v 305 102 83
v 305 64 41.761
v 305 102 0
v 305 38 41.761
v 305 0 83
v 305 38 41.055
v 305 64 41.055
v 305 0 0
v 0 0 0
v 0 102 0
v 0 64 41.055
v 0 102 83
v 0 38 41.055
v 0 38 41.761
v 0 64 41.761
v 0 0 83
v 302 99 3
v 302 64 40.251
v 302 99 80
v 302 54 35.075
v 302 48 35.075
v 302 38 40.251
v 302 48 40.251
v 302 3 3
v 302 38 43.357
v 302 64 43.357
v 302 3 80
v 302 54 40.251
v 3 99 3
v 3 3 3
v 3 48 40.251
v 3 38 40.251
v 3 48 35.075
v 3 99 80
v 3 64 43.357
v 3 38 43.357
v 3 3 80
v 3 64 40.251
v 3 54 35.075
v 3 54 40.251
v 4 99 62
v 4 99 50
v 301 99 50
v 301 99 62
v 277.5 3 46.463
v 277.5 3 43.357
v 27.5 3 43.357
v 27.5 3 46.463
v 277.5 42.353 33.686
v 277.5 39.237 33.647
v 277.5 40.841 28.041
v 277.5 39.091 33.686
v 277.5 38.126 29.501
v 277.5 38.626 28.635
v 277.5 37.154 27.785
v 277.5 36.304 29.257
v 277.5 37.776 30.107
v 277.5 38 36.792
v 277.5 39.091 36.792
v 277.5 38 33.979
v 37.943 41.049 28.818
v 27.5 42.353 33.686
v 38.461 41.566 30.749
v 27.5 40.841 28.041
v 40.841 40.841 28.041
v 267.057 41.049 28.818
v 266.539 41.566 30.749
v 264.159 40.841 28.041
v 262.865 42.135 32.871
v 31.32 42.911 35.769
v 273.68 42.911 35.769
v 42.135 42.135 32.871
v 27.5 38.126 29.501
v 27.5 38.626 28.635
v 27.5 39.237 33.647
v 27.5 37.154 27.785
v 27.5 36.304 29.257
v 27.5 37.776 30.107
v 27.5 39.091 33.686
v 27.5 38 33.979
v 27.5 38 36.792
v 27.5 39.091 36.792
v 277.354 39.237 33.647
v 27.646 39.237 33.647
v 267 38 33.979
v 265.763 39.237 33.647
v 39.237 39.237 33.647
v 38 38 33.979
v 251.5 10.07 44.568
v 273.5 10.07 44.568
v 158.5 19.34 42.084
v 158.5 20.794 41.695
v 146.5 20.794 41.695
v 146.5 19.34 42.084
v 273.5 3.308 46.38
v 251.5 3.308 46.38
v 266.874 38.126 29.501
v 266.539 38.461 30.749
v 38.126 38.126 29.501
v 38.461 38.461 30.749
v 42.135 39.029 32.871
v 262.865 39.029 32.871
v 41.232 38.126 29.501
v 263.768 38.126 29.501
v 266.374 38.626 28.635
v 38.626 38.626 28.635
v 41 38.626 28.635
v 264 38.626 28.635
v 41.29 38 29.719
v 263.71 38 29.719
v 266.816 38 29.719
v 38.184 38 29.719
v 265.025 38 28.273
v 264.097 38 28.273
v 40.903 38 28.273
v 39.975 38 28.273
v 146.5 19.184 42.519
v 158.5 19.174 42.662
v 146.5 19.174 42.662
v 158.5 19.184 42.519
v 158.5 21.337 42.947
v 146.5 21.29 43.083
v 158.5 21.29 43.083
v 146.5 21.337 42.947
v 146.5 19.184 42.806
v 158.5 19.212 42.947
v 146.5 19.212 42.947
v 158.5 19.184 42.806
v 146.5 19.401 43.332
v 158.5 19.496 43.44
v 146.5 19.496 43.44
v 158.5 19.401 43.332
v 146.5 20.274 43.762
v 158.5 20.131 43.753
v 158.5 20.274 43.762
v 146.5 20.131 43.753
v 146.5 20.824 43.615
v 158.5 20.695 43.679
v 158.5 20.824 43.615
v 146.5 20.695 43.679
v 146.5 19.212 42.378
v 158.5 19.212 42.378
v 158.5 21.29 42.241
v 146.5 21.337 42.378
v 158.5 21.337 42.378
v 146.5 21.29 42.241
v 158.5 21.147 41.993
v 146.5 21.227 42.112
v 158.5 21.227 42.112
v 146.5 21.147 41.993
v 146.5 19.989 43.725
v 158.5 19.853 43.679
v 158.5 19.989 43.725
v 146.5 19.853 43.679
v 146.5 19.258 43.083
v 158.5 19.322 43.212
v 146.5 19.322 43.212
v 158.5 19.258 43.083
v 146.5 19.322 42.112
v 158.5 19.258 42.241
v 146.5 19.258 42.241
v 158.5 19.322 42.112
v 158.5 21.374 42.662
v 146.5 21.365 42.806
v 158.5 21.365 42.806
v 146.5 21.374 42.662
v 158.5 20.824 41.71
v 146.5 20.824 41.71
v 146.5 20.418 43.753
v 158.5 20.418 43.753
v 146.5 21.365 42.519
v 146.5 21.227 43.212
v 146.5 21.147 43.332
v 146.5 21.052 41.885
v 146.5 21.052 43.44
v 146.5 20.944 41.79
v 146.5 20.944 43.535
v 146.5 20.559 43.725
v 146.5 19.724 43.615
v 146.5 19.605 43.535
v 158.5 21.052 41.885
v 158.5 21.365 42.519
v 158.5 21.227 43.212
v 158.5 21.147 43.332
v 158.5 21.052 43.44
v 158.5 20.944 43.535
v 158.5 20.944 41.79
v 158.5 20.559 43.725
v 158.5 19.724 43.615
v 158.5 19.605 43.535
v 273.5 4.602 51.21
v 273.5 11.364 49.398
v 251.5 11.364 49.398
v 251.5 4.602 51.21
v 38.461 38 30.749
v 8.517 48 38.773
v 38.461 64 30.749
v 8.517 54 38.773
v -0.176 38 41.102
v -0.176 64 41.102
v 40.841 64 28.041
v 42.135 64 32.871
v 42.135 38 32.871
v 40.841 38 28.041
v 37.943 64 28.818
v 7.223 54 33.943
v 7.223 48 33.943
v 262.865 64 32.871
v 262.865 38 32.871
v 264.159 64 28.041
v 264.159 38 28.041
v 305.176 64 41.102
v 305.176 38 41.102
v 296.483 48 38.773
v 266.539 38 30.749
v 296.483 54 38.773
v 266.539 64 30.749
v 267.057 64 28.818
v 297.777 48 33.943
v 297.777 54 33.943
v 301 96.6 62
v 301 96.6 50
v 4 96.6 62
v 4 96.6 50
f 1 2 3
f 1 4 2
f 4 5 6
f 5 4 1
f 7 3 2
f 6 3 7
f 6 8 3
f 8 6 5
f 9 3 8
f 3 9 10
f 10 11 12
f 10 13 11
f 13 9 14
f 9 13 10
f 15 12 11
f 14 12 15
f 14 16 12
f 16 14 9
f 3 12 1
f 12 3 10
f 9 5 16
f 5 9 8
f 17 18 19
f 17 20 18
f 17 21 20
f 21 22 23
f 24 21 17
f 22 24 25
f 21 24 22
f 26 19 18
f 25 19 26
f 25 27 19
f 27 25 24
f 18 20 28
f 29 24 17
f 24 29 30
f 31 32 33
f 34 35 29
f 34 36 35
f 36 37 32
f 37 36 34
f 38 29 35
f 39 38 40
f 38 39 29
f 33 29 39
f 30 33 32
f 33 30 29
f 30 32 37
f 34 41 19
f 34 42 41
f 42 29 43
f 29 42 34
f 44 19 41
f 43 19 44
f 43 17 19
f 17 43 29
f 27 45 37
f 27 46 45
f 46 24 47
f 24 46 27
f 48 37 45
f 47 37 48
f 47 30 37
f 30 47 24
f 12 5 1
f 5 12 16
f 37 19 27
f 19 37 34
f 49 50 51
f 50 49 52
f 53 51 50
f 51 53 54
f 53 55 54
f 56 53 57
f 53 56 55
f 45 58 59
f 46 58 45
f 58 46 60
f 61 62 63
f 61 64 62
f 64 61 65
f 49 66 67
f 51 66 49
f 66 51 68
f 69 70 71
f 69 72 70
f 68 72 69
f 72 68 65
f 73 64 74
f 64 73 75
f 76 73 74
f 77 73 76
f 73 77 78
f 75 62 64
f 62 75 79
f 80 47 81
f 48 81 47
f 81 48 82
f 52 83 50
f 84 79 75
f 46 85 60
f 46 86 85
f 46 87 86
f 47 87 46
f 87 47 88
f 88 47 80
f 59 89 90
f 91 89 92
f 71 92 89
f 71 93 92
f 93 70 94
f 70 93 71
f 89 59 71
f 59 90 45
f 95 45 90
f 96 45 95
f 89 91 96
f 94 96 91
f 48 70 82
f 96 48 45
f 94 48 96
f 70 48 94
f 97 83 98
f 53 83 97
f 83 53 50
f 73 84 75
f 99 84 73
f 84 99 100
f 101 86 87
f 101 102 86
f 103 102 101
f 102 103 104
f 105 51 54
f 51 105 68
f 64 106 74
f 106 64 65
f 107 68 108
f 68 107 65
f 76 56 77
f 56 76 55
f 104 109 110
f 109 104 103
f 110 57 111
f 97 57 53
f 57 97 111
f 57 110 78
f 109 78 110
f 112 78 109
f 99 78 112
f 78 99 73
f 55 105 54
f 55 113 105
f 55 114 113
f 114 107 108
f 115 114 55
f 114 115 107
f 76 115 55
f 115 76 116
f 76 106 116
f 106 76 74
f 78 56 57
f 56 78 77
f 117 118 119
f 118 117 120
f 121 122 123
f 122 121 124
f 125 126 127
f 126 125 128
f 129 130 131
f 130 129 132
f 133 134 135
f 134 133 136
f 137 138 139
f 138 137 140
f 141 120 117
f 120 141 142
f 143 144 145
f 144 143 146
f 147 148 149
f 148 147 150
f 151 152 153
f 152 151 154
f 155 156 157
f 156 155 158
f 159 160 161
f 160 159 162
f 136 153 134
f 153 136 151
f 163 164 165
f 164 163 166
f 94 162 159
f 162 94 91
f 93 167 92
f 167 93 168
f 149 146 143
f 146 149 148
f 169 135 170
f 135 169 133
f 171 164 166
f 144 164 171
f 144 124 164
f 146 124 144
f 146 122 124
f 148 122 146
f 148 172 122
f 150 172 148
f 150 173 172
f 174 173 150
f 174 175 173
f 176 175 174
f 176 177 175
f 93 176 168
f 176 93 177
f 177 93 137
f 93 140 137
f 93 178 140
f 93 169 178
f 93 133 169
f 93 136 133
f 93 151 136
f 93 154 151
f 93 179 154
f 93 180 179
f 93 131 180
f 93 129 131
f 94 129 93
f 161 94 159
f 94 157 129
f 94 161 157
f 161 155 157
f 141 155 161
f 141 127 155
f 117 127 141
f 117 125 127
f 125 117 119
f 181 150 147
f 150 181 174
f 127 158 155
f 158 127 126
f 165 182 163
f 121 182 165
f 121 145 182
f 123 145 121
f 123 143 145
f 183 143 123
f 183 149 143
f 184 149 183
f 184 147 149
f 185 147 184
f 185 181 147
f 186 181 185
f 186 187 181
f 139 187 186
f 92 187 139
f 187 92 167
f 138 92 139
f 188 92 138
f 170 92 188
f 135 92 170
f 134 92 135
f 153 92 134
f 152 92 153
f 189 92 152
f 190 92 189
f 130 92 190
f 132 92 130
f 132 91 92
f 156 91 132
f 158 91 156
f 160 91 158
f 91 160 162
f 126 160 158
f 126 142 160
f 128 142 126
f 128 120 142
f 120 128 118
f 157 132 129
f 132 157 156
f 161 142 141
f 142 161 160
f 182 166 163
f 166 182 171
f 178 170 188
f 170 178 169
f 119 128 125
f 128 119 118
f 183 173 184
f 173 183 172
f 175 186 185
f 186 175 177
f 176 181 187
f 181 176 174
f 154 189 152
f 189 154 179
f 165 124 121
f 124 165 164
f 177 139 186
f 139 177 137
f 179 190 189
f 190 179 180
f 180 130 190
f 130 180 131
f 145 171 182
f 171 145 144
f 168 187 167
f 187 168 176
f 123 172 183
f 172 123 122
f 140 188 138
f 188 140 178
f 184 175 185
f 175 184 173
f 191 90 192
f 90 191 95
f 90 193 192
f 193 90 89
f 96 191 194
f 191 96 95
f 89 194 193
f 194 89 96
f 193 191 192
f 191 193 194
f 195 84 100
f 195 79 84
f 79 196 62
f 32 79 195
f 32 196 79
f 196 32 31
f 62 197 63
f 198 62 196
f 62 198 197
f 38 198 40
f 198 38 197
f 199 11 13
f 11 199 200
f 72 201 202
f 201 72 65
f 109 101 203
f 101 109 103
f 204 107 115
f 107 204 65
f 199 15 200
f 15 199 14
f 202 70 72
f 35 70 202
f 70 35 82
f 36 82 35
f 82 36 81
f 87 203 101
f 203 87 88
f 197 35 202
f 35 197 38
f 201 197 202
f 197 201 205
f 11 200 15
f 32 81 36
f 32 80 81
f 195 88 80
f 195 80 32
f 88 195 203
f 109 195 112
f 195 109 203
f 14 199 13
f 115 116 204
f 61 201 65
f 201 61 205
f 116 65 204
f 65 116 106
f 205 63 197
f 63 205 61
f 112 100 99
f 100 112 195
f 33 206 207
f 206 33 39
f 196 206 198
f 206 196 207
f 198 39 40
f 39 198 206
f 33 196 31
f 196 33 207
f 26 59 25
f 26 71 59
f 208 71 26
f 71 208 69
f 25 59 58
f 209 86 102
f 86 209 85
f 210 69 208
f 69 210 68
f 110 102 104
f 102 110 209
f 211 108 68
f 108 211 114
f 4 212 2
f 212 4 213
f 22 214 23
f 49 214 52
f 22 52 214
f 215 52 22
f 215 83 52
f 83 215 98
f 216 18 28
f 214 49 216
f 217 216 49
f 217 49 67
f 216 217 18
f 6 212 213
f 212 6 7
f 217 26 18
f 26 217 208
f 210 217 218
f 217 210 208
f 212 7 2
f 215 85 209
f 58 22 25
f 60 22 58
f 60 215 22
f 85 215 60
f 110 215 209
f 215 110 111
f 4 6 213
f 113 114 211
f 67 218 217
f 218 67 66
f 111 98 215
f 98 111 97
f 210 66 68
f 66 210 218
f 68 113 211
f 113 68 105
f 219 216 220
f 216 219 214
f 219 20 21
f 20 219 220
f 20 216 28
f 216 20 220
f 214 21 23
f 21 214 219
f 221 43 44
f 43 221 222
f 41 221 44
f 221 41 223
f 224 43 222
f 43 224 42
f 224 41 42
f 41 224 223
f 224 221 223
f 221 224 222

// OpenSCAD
// file: common.scad
// common.scad — shared geometry for FLIP-LEVER / CAM-LATCH RIM CLAMP family
// Coordinate frame:
//   X: 0..305 (long axis)   Y: 0..102 (Y=0 FRONT/open, Y=102 BACK/door=FLUSH)
//   Z: up.  New tray base z=0, top face z=50.  Top tray base z=50, rim top z=83.
// ALL levers/hinges live on FRONT wall (y=0) and SHORT ENDS (x=0, x=305).
// NOTHING crosses y=102 (door face). Top tray gets ZERO added geometry.

// ── master dims ────────────────────────────────────────────────
NW = 305;  ND = 102;  NH = 50;   // new tray
TW = 305;  TD = 102;  TH = 33;   // top tray (FIXED reference)
wall = 3;
rim_top_z = NH + TH;             // = 83

// ── colours ────────────────────────────────────────────────────
C_new   = "#1565C0";
C_top   = "#90A4AE";
C_lever = "#EF6C00";   // override per file if desired

// ── core tray bodies ───────────────────────────────────────────
module new_tray() {
    color(C_new)
    difference() {
        cube([NW, ND, NH]);
        translate([wall, wall, wall])
            cube([NW-2*wall, ND-2*wall, NH]);
        // side windows (long walls): 45(X)x16(Z), center z=64 -> 56..72
        for (cx = [76.25, 152.5, 228.75]) {
            // FRONT wall y=0..3
            translate([cx-22.5, -0.1, 56]) cube([45, wall+0.2, 16]);
            // BACK wall y=99..102
            translate([cx-22.5, ND-wall-0.1, 56]) cube([45, wall+0.2, 16]);
        }
    }
}

// FLUSH back guide wall: a low rib on the new tray top face along the BACK
// edge that pockets the top tray's outer wall from the INSIDE only.
// It rises to z below the rim and DOES NOT overhang the drop path and
// NEVER crosses y=102 (it sits inboard of the door face).
module back_guide() {
    gw = 2.4;          // guide rib thickness
    gh = 12;           // rib height above new tray top (z=50..62)
    inset = wall;      // inner face aligns to tray inner wall (y=99 plane outer)
    color(C_new)
    translate([wall+1, ND - wall - gw, NH])
        cube([NW - 2*(wall+1), gw, gh]);
}

module top_tray() {
    color(C_top)
    translate([0, 0, NH])
    difference() {
        cube([TW, TD, TH]);
        translate([wall, wall, 0])
            cube([TW-2*wall, TD-2*wall, TH-wall]);
    }
}
// main file
// 01_fullbar_living.scad
// FLIP-LEVER RIM CLAMP — Variant (a): one FULL-LENGTH flip bar on the FRONT
// (living hinge) + one end clamp at each SHORT END. NOTHING on the back/door.
//
// Hinge: living hinge (thinned 0.6mm web) at the bar root on the FRONT outer
// wall, axis horizontal along X at z=44 (6mm below new-tray top, well below rim).
// OPEN  (lock=0): bar folded DOWN-AND-OUT flat against front wall (-Y), low
//                 profile, leaves the vertical drop path clear -> top lifts up.
// LOCKED(lock=1): bar flips UP-AND-IN; cam lip reaches over the rim (z>=83)
//                 and a wall detent holds it. End clamps swing in over the rim
//                 corners.
//
// Render: -D 'lock=0' or -D 'lock=1'
include <common.scad>
C_lever = "#2E7D32";
lock = 0;
$fn = 48;

// ── front bar geometry ─────────────────────────────────────────
hinge_z   = NH - 6;        // z=44 pivot, below rim
bar_len   = 250;           // along X, centered
bar_t     = 3.0;           // bar thickness (radial)
arm_len   = rim_top_z - hinge_z + 4;   // reach from pivot up past rim = ~43
lhinge_t  = 0.6;           // living hinge web
lip_ext   = 5;             // cam lip inward reach over rim
lip_t     = 3.0;           // lip thickness (sits at/above rim top)

// Angle: bar measured about +X axis. 0 = pointing straight UP (+Z).
// open: rotate -100deg so the arm lies down/out toward -Y (front, outward).
// locked: rotate to ~+6deg so the arm leans slightly inward, lip over rim.
ang_open   = -105;
ang_locked = 6;
bar_ang = lock ? ang_locked : ang_open;

// rotate about X at pivot. Front pivot sits at y = lhinge_t (just off wall).
module front_flip_bar() {
    color(C_lever)
    translate([(NW-bar_len)/2, lhinge_t, hinge_z])
    rotate([bar_ang, 0, 0])
    union() {
        // arm shaft (grows in +Z; thickness in -Y so lip curls toward +Y inward)
        translate([0, -bar_t, 0]) cube([bar_len, bar_t, arm_len]);
        // cam lip at top, curls INWARD (+Y) over the rim
        translate([0, 0, arm_len - lip_t])
            cube([bar_len, lip_ext, lip_t]);
        // lead chamfer on lip underside
        translate([0, lip_ext, arm_len - lip_t])
            rotate([45,0,0]) translate([0,-1.2,-1.2]) cube([bar_len,1.7,1.7]);
        // detent bump (back face of arm) that snaps to wall pocket when locked
        translate([bar_len/2-6, -bar_t-0.8, arm_len*0.45])
            rotate([0,90,0]) cylinder(r=1.1, h=12);
        // finger tab projecting outward (-Y) at one end
        translate([bar_len-26, -bar_t-5, 2]) cube([22, 5, 7]);
    }
}

// living-hinge web connecting bar root to front wall (drawn at rest, vertical)
module front_hinge_web() {
    color(C_lever)
    translate([(NW-bar_len)/2, 0, hinge_z-3])
        cube([bar_len, lhinge_t, 3]);
}

// ── END CLAMP (short ends x=0 and x=305) ───────────────────────
// Pin/living-hinge lever on the END wall, axis horizontal along Y at z=44.
// Swings up-and-over the rim CORNER. side = -1 (x=0 end) or +1 (x=305 end).
end_arm_len = arm_len;
end_w       = 26;          // width along Y
module end_clamp(side) {
    // place at x=0 (side -1) or x=305 (side +1); pivot just off the end face
    xbase = side<0 ? lhinge_t : NW - lhinge_t;
    // open: fold out along the end (away in X); locked: up-and-in over corner
    eo = -105; el = 6;
    eang = lock ? el : eo;
    yoff = (ND-end_w)/2;
    color(C_lever)
    translate([xbase, yoff, hinge_z])
    // rotate about Y axis; mirror for the +X end
    rotate([0, side<0 ? -eang : eang, 0])
    union() {
        // arm grows +Z; thickness pushes outward in X then lip curls in
        sx = side<0 ? 1 : -1;
        translate([sx<0 ? -bar_t:0, 0, 0]) cube([bar_t, end_w, end_arm_len]);
        // lip curls inward over rim corner
        translate([sx<0 ? -lip_ext:0, 0, end_arm_len-lip_t])
            cube([lip_ext, end_w, lip_t]);
        // finger tab
        translate([sx<0 ? -bar_t-5:bar_t, end_w/2-3, 2]) cube([5,6,7]);
    }
}

// ── assembly ───────────────────────────────────────────────────
new_tray();
back_guide();
top_tray();
front_hinge_web();
front_flip_bar();
end_clamp(-1);
end_clamp(1);
